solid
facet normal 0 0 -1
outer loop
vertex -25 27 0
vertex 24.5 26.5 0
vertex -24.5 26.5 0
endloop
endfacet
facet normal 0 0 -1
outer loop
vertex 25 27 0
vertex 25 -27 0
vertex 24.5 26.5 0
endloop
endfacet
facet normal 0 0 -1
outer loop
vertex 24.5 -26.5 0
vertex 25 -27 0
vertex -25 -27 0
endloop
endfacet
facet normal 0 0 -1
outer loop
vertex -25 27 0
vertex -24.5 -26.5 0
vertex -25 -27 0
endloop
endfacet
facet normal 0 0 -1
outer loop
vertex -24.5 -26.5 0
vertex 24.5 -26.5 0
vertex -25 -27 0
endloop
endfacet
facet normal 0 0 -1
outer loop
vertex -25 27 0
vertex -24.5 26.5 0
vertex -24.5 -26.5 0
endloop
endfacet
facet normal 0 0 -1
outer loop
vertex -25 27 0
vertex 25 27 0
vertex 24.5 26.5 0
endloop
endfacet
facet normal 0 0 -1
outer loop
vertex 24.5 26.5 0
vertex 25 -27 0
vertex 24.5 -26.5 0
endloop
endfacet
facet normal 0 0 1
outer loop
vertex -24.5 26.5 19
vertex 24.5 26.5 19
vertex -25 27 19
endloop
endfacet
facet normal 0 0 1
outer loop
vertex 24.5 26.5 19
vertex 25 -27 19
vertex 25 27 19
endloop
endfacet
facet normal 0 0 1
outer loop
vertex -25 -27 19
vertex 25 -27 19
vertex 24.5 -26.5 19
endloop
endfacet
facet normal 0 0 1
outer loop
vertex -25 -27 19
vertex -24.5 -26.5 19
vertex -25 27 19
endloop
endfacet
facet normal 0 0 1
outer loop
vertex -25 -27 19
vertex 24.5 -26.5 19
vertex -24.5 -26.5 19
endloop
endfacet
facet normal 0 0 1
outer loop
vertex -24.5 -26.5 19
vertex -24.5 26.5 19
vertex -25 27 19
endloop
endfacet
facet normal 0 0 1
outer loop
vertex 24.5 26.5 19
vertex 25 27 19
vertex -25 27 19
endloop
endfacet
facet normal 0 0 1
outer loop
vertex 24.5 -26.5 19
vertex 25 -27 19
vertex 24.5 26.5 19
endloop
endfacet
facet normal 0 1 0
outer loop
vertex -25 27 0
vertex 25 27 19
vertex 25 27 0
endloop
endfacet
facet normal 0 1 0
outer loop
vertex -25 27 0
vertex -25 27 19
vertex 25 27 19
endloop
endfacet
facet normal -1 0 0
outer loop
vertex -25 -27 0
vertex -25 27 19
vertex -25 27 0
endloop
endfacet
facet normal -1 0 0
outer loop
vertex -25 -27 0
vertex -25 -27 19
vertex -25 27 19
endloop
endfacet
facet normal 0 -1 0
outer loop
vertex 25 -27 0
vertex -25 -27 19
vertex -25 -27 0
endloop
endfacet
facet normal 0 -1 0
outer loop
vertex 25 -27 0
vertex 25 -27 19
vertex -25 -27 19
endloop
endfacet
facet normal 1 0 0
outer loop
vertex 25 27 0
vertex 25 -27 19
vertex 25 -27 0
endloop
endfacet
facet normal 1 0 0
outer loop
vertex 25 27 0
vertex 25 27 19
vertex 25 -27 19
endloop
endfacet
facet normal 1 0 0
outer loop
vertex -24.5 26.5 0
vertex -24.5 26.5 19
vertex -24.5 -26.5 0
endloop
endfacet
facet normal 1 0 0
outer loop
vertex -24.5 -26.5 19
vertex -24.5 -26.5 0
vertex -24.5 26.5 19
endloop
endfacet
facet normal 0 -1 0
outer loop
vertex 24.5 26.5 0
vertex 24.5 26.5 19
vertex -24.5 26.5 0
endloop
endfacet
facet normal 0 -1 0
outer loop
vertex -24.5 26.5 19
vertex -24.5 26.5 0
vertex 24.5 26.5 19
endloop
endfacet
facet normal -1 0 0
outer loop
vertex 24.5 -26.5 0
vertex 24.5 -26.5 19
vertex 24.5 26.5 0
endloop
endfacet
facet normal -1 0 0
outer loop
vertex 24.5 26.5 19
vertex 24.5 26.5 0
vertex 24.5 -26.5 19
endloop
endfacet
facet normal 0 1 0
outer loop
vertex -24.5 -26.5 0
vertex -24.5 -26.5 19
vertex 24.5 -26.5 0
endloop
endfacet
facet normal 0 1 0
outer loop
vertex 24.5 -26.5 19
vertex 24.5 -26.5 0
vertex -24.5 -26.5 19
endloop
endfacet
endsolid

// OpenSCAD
// datasheet: https://www.tme.eu/Document/8721c1e12f28e68114c83752997c605d/3710.pdf
CHASSIS_X_LENGTH = 50;
CHASSIS_Y_LENGTH = 54;
CHASSIS_Z_LENGTH = 19;
CHASSIS_THICKNESS = 0.5;

// Increase steps in render to have quality circles
$fs=0.01;


module RFShieold() {
  
    linear_extrude(height = CHASSIS_Z_LENGTH, convexity = 10, twist = 0)
        translate([-CHASSIS_X_LENGTH/2, -CHASSIS_Y_LENGTH/2,0])
            difference()
            {
                square([CHASSIS_X_LENGTH, CHASSIS_Y_LENGTH]);
                translate([CHASSIS_THICKNESS, CHASSIS_THICKNESS, 0])
                square([CHASSIS_X_LENGTH-2*CHASSIS_THICKNESS, CHASSIS_Y_LENGTH-2*CHASSIS_THICKNESS]);
            }
}

RFShieold();
